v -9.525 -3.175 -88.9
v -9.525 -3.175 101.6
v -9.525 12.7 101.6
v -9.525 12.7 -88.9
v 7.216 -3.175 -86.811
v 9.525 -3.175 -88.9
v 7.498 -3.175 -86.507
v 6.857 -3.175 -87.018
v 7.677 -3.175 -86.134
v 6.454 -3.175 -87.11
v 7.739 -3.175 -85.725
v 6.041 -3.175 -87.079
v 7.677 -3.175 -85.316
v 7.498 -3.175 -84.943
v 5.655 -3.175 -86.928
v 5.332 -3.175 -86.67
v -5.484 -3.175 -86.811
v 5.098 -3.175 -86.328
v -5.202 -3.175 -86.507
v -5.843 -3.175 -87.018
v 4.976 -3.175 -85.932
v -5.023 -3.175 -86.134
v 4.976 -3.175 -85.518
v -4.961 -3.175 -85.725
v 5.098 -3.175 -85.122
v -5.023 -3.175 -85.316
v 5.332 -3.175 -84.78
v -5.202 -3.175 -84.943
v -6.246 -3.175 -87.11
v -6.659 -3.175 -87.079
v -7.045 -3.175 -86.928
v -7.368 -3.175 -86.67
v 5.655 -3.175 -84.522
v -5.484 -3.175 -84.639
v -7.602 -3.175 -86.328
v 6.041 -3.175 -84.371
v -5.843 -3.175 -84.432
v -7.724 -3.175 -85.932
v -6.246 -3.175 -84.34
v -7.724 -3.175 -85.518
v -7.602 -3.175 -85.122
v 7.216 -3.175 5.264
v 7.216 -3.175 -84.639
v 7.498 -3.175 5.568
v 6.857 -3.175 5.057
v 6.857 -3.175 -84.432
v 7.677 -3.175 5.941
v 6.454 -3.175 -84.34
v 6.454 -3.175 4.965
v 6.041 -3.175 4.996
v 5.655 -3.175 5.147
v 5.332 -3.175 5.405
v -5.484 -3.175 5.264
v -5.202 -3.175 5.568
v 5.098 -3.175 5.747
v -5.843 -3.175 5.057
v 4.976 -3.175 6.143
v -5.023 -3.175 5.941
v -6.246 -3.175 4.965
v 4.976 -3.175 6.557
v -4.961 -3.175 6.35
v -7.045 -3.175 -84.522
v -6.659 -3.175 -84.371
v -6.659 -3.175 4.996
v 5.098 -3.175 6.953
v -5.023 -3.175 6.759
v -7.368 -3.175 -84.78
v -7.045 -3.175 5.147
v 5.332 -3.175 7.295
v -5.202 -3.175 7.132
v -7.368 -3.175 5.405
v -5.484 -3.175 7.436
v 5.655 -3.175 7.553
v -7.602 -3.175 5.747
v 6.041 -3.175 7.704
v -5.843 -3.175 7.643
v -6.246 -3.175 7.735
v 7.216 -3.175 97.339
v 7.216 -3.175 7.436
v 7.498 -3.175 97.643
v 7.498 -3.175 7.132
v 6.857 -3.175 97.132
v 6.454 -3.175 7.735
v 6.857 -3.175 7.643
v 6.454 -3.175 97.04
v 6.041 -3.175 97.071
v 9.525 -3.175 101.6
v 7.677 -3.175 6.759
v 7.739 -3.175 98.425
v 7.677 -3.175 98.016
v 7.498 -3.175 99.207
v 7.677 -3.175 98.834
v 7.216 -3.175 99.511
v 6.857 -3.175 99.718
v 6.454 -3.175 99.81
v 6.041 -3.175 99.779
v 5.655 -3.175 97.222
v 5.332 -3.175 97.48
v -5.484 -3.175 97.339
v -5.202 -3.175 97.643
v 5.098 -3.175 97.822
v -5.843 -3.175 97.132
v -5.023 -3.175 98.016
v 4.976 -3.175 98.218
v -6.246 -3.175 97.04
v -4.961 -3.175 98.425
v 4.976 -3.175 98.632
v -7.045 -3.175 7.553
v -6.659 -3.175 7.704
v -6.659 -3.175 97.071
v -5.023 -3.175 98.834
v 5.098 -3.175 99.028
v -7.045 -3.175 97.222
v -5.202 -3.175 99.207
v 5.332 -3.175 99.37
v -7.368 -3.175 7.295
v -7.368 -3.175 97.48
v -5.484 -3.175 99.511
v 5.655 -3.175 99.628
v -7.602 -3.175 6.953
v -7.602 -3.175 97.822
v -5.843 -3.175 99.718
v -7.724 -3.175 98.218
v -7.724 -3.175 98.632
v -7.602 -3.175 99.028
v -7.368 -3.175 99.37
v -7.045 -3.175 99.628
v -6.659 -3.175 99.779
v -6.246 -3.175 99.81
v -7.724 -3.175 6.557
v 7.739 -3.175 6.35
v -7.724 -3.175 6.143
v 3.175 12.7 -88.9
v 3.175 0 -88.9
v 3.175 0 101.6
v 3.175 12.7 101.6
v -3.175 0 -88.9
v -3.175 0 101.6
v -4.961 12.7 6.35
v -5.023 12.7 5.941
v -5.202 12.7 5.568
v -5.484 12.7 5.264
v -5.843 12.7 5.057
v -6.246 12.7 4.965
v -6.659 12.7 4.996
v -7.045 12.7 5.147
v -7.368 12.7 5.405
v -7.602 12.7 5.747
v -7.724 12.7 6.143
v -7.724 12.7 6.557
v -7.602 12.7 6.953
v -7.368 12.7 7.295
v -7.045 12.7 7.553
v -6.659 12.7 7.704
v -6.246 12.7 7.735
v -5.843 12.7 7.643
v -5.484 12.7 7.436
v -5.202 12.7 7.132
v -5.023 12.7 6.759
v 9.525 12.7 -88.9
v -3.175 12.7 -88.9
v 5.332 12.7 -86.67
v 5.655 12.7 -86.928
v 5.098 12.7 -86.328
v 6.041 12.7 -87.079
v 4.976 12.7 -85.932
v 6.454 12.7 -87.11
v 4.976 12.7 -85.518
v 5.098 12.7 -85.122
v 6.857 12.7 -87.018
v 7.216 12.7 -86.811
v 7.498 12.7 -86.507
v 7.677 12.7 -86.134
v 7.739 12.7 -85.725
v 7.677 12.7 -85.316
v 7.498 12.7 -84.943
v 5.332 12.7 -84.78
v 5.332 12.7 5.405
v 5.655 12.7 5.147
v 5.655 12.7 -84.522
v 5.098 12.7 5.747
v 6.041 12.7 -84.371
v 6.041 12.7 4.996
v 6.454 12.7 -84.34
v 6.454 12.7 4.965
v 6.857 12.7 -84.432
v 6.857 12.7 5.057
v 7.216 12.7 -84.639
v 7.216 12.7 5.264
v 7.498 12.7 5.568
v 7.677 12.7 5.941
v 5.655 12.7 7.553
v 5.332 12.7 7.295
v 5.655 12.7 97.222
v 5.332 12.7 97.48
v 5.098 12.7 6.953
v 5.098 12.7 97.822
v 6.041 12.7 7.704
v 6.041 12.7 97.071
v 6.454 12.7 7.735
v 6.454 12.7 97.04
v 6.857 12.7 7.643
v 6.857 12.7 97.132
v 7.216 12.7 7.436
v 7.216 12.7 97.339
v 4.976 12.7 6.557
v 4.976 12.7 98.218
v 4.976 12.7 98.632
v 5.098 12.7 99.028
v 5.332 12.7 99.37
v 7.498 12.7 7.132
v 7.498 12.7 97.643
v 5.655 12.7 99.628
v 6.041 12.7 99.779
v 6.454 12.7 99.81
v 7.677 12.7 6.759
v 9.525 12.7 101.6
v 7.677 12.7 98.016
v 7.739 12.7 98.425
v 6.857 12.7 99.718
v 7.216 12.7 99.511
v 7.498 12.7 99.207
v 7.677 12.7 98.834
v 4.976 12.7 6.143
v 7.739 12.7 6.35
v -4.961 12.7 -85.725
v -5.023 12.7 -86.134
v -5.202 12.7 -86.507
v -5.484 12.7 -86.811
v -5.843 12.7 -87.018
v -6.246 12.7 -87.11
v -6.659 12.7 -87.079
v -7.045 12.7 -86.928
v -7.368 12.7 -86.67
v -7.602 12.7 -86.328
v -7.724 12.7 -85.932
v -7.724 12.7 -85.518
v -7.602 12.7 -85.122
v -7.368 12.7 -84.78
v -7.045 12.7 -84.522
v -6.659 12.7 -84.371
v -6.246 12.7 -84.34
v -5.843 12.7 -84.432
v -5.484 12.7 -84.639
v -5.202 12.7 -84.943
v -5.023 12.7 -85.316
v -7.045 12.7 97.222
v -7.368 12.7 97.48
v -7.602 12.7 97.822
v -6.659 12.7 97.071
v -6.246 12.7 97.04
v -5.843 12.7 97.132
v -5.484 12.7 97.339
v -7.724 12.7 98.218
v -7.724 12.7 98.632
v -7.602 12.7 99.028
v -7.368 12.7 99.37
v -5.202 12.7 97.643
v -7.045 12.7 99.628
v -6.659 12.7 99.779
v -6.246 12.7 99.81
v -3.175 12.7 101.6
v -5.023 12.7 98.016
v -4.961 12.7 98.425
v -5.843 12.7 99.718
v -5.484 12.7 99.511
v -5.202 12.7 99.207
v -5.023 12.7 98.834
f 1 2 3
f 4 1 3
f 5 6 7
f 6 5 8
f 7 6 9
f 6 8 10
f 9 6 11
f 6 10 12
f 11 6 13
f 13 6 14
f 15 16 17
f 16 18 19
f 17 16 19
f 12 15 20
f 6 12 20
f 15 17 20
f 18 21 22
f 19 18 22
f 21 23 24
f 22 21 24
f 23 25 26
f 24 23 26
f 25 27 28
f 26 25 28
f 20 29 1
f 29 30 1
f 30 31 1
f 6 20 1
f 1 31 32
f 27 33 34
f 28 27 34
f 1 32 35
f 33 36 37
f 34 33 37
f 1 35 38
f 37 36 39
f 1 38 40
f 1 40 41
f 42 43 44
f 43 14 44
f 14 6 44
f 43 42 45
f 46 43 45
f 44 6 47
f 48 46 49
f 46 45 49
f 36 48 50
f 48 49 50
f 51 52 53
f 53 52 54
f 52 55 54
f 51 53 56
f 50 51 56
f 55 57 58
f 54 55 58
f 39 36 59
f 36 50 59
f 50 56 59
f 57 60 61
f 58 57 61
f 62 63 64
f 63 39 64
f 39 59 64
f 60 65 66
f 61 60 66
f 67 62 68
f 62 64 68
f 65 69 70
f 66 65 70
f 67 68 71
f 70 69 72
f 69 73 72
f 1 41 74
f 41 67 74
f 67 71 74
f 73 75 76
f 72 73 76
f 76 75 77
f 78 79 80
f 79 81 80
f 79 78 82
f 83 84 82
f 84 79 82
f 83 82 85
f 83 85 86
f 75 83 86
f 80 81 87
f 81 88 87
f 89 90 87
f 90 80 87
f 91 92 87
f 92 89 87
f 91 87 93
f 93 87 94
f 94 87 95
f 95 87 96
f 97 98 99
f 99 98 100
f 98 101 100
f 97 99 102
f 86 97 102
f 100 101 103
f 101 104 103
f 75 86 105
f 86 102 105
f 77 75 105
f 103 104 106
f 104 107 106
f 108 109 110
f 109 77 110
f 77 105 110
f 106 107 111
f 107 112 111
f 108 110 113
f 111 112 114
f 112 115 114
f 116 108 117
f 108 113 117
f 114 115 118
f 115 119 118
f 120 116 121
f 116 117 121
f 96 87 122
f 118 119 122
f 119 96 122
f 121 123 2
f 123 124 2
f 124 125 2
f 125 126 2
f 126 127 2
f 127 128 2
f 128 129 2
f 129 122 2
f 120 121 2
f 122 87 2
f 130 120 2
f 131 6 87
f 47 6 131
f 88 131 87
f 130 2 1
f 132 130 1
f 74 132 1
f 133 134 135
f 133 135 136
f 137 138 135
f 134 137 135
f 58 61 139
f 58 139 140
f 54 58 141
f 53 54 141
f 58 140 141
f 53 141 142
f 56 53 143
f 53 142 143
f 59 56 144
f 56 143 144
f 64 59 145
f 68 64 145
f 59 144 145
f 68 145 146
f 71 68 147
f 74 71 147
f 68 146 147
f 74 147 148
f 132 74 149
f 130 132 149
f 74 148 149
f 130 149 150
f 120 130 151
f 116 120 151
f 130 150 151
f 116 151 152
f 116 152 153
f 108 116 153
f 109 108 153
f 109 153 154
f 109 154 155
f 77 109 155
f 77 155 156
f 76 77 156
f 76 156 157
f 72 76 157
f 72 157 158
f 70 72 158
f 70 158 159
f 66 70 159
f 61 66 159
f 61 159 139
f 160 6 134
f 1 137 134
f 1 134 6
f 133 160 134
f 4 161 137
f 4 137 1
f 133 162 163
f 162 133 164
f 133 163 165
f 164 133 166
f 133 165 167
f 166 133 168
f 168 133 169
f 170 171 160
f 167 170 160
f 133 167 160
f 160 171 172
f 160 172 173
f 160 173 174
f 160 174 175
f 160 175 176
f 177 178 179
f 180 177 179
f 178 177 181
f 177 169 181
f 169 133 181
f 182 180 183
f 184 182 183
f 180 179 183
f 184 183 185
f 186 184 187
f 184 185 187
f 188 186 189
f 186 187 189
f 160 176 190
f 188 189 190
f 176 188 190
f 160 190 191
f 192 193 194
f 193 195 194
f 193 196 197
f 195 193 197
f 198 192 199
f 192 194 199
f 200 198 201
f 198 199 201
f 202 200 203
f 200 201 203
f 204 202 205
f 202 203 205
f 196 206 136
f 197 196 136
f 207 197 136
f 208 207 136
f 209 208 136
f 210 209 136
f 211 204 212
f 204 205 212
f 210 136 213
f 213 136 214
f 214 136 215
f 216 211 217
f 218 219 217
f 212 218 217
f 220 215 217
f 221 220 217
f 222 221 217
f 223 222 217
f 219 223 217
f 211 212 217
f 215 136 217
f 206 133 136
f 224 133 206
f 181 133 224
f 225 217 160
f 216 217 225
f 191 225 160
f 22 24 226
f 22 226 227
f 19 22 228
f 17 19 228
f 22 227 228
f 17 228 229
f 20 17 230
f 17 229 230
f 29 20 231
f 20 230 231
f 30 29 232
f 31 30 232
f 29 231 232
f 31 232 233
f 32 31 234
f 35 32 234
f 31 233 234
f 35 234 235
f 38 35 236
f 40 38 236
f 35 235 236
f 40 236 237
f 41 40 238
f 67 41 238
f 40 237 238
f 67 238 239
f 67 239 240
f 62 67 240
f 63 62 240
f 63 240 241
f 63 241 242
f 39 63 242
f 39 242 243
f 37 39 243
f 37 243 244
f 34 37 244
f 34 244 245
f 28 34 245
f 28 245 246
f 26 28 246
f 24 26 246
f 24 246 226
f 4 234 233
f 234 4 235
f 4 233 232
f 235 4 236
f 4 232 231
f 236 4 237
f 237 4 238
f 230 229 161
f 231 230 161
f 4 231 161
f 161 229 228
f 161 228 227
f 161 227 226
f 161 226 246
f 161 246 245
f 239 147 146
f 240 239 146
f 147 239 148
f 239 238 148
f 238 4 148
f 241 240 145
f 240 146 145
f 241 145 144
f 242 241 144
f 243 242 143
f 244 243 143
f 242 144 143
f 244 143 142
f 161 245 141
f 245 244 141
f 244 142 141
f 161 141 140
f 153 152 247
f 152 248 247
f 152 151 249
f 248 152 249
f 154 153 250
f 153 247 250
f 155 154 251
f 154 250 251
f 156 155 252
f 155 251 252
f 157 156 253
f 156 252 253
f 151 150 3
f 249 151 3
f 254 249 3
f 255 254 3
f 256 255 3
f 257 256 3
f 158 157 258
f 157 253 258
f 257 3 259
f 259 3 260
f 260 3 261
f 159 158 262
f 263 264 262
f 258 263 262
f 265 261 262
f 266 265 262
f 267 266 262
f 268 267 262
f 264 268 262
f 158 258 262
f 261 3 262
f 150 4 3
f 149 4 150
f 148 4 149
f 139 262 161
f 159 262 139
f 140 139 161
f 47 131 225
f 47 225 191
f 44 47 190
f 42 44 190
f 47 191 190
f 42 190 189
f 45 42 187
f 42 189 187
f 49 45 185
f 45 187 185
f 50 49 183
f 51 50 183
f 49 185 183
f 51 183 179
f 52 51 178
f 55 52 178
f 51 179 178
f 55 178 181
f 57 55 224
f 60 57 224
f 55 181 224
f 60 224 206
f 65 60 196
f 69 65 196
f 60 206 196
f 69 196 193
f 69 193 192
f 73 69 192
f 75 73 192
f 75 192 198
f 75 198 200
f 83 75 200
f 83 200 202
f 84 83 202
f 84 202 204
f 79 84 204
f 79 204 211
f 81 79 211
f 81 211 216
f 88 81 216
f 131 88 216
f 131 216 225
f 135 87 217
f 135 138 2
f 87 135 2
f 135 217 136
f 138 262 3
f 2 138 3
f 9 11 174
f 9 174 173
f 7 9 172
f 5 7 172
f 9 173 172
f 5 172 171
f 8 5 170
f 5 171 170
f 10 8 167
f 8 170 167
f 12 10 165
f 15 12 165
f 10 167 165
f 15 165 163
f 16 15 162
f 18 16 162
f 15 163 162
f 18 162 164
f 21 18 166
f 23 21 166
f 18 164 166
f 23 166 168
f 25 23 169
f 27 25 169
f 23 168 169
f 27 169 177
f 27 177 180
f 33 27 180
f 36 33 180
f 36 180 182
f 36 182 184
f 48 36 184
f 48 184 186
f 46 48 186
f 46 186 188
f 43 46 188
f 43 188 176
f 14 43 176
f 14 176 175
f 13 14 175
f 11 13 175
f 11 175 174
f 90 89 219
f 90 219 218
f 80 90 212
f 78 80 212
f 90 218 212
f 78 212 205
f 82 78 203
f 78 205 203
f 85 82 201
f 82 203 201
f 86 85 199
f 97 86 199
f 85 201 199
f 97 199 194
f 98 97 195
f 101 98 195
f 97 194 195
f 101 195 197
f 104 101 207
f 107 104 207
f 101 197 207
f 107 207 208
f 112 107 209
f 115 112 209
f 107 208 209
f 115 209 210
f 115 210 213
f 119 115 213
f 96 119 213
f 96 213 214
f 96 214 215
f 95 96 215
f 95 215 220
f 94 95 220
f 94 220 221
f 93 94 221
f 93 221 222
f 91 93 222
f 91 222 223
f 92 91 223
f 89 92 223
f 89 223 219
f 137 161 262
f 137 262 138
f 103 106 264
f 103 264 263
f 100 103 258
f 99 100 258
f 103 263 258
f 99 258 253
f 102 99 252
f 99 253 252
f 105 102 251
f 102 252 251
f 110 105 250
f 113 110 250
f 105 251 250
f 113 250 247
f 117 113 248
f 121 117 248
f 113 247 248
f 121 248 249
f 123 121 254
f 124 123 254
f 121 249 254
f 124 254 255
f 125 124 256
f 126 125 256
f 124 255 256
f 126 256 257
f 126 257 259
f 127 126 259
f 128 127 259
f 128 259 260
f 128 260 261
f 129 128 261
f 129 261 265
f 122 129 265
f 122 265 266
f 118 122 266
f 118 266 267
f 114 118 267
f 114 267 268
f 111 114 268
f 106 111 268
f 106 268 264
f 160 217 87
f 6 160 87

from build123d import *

# Parameters (mm, degrees)
BOSS_EXTRUDE1_DEPTH     = 101.6
SKETCH2_W               = 19.05
SKETCH2_H               = 15.875
CUT_EXTRUDE1_DEPTH      = 6.35
SKETCH3_W               = 19.05
SKETCH3_H               = 15.875
CUT_EXTRUDE2_DEPTH      = 6.35
SKETCH4_R               = 1.3890625
CUT_EXTRUDE3_DEPTH      = 1
CUT_EXTRUDE3_DEPTH_BACK = 16.875


with BuildPart() as part:
    # Sketch1 → Boss-Extrude1 (new body, symmetric)
    with BuildSketch(Plane.XY):
        Polygon((-9.525, 12.7), (-3.175, 12.7), (-3.175, 0), (3.175, 0), (3.175, 12.7), (9.525, 12.7), (9.525, -3.175), (-9.525, -3.175), align=None)
    extrude(amount=BOSS_EXTRUDE1_DEPTH, both=True)

    # Sketch2 → Cut-Extrude1 (cut)
    with BuildSketch(Plane.XY.offset(-101.6)):
        with Locations((0, 4.7625)):
            Rectangle(SKETCH2_W, SKETCH2_H)
    extrude(amount=CUT_EXTRUDE1_DEPTH, mode=Mode.SUBTRACT)

    # Sketch3 → Cut-Extrude2 (cut)
    with BuildSketch(Plane(origin=(0, 0, -95.25), x_dir=(-1, 0, 0), z_dir=(0, 0, -1))):
        with Locations((0, 4.7625)):
            Rectangle(SKETCH3_W, SKETCH3_H)
    extrude(amount=-CUT_EXTRUDE2_DEPTH, mode=Mode.SUBTRACT)

    # Sketch4 → Cut-Extrude3 (cut, two sides)
    with BuildSketch(Plane(origin=(0, 12.7, 0), x_dir=(1, 0, 0), z_dir=(0, 1, 0))) as cut_extrude3_sk:
        with Locations((6.35, 85.725)):
            Circle(SKETCH4_R)
        with Locations((-6.35, 85.725)):
            Circle(SKETCH4_R)
        with Locations((6.35, -6.35)):
            Circle(SKETCH4_R)
        with Locations((-6.35, -6.35)):
            Circle(SKETCH4_R)
        with Locations((6.35, -98.425)):
            Circle(SKETCH4_R)
        with Locations((-6.35, -98.425)):
            Circle(SKETCH4_R)
    extrude(amount=CUT_EXTRUDE3_DEPTH, mode=Mode.SUBTRACT)
    extrude(cut_extrude3_sk.sketch, amount=-CUT_EXTRUDE3_DEPTH_BACK, mode=Mode.SUBTRACT)


solid = part.part
